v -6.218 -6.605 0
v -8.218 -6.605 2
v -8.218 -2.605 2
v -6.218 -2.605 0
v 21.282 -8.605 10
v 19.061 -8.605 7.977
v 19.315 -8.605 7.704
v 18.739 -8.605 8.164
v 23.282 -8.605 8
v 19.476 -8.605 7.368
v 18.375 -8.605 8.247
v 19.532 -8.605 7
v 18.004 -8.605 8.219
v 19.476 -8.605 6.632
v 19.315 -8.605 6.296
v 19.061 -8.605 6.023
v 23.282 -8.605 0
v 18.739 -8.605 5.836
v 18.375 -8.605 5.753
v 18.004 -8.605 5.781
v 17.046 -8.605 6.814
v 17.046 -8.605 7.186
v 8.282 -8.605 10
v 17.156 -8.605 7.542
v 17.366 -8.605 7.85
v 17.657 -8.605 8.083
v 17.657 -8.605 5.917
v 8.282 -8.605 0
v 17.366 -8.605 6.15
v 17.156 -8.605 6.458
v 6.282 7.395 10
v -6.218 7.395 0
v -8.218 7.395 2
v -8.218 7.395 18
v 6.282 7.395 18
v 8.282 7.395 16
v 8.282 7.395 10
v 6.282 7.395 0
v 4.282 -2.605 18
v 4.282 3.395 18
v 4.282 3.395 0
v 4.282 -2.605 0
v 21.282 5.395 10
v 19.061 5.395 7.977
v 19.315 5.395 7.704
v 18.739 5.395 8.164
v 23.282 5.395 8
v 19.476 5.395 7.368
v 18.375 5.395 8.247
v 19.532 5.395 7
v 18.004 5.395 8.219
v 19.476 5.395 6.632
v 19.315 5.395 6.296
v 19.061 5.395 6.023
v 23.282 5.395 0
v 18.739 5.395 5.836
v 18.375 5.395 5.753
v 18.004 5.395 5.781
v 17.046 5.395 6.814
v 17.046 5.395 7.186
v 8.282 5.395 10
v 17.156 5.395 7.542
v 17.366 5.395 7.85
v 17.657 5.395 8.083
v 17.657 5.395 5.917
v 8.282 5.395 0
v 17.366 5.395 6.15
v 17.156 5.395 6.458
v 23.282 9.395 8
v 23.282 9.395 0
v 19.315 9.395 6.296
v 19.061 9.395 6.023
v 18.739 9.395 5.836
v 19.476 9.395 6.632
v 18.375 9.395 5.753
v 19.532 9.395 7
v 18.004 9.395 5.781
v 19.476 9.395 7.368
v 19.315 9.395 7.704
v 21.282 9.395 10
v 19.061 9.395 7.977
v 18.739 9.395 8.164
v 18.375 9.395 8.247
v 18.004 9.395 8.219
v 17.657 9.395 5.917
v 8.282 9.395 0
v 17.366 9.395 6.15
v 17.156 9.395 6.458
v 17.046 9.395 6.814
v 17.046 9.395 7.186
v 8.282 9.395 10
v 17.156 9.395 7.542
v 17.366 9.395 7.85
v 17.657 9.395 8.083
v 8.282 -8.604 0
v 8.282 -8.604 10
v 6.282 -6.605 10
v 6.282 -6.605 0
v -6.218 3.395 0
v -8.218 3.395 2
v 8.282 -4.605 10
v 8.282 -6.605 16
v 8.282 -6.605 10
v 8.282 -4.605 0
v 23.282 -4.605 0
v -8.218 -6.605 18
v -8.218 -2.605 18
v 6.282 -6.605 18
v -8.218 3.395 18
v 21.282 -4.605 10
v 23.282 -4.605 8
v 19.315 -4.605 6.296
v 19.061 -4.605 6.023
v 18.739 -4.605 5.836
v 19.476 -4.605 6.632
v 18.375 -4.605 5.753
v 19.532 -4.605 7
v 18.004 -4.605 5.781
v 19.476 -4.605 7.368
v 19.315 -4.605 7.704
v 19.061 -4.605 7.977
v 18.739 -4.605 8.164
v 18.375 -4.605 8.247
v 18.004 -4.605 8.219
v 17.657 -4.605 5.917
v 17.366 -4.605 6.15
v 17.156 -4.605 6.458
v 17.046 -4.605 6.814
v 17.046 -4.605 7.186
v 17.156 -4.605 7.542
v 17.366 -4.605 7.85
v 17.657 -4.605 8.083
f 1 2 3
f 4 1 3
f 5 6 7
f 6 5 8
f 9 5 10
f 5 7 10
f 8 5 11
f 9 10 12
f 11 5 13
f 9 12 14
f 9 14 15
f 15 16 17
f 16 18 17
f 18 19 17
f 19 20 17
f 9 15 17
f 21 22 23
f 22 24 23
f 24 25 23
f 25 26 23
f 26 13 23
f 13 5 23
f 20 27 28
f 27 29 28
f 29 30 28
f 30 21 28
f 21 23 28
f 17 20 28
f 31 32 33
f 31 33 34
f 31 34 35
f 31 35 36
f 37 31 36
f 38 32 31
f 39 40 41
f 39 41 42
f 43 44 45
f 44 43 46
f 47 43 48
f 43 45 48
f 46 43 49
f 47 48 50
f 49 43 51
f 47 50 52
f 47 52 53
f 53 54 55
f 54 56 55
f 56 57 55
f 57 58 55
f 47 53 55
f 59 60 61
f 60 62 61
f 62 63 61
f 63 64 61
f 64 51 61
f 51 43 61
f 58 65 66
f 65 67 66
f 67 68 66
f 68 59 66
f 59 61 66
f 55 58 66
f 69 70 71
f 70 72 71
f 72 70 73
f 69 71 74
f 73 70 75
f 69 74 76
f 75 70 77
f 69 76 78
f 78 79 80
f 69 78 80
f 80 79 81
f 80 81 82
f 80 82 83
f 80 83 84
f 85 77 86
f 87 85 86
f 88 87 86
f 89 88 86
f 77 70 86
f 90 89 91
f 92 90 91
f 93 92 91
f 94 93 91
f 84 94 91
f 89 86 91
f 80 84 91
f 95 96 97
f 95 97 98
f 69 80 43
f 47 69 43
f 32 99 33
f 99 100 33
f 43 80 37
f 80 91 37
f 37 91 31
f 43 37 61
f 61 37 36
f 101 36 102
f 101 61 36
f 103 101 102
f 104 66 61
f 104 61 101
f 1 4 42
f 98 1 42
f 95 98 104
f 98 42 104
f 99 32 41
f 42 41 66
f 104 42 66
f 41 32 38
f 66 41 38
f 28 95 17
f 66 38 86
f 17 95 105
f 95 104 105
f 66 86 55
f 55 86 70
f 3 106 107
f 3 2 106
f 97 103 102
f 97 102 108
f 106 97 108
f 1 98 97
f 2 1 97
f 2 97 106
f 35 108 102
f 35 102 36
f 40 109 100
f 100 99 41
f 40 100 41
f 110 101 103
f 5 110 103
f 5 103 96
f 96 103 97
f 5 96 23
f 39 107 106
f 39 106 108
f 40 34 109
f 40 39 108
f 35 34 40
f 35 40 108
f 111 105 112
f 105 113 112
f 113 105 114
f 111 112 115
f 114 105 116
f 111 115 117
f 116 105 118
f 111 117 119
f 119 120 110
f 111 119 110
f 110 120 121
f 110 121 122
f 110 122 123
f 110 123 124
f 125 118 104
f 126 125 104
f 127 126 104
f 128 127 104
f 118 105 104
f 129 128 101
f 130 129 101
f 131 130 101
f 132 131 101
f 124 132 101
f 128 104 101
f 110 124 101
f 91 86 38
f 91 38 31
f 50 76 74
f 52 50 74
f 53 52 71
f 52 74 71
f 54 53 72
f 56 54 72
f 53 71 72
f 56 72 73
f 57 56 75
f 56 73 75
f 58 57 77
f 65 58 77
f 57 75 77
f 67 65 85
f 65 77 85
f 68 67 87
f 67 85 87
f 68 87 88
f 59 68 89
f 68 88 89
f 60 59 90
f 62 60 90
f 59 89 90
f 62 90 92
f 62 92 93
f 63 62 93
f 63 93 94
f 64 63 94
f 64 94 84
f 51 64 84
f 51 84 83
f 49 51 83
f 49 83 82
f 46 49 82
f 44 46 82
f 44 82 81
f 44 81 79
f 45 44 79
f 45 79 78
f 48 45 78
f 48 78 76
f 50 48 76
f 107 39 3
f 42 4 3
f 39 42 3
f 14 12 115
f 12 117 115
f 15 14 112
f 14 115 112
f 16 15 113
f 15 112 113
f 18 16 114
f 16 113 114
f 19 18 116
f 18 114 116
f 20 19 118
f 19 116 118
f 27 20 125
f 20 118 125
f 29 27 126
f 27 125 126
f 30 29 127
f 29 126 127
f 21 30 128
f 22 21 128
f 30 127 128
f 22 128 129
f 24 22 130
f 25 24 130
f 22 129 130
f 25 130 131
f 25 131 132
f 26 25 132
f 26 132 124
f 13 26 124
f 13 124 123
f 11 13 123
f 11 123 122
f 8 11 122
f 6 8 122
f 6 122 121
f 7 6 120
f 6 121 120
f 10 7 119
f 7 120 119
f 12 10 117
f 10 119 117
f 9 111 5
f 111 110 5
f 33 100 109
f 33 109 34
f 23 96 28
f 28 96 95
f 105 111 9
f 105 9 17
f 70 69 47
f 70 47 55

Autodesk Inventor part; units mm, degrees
ref_plane "YZ Plane" through (0, 0, 0) normal (1, 0, 0) x (0, 1, 0)
ref_plane "XZ Plane" through (0, 0, 0) normal (0, 1, 0) x (-1, 0, 0)
ref_plane "XY Plane" through (0, 0, 0) normal (0, 0, 1) x (1, 0, 0)
sketch "Sketch1" plane through (0, 0, 0) normal (0, 0, 1) x (1, 0, 0)
  line L0 (-8.218, 3.3953) -> (4.282, 3.3953)
  line L1 (4.282, 3.3953) -> (4.282, -2.6047)
  line L2 (4.282, -2.6047) -> (-8.218, -2.6047)
  line L3 (-8.218, -2.6047) -> (-8.218, 3.3953)
  line L4 (-8.218, 7.3953) -> (8.282, 7.3953)
  line L5 (8.282, 7.3953) -> (8.282, -6.6047)
  line L6 (8.282, -6.6047) -> (-8.218, -6.6047)
  line L7 (-8.218, -6.6047) -> (-8.218, 7.3953)
  point P0 (0, 0)
  dimension "d0" = 12.5
  dimension "d1" = 6
  dimension "d2" = 4
  dimension "d3" = 4
  dimension "d4" = 4
extrude "Extrusion1" add sketch "Sketch1" along normal blind 18 contours L7 L4 L5 L6 L2 L1 L0
sketch "Sketch2" plane through (8.282, -6.6047, 0) normal (1, 0, 0) x (0, 0, -1)
  line L0 (-10, 12) -> (0, 12)
  line L1 (0, 12) -> (0, 2)
  line L2 (0, 2) -> (-10, 2)
  line L3 (-10, 2) -> (-10, 12)
  line L4 (0, 14) -> (0, 0) projected
  line L5 (0, 14) -> (-18, 14) projected
  line L6 (0, 0) -> (-18, 0) projected
  line L7 (-10, 12) -> (0, 12)
  line L8 (0, 12) -> (0, 16)
  line L9 (0, 16) -> (-10, 16)
  line L10 (-10, 16) -> (-10, 12)
  line L11 (0, 2) -> (-10, 2)
  line L12 (-10, 2) -> (-10, -2)
  line L13 (-10, -2) -> (0, -2)
  line L14 (0, -2) -> (0, 2)
  point P0 (0, 6.6047)
  dimension "d7" = 10
  dimension "d8" = 10
  dimension "d9" = 2
  dimension "d10" = 2
  dimension "d11" = 4
  dimension "d12" = 4
extrude "Extrusion2" add sketch "Sketch2" along normal blind 15 contours L10 L5 L4 L0 | L2 L4 L6 L12 | L10 L9 L8 L5 | L6 L14 L13 L12
chamfer "Chamfer1" distance 2 angle 45 1 edges at (8.282, -6.6047, 5)
chamfer "Chamfer2" distance 2 angle 45 1 edges at (8.282, 7.3953, 5)
sketch "Sketch3" plane through (23.282, 9.3953, 10) normal (0, 1, 0) x (1, 0, 0)
  line L0 (-15, 0) -> (0, 0) projected
  line L1 (0, 10) -> (0, 0) projected
  circle A0 centre (-5, 3) radius 1.25
  point P0 (-23.282, 10)
  dimension "d21" = 3
  dimension "d22" = 5
  dimension "d23" = 2.5
extrude "Extrusion3" cut sketch "Sketch3" against normal blind 30
chamfer "Chamfer3" distance 2 angle 45 4 edges at (23.282, -6.6047, 10) (23.282, 7.3953, 10) (-8.218, 5.3953, 0) (-8.218, -4.6047, 0)
chamfer "Chamfer4" distance 2 angle 45 1 edges at (8.282, 0.3953, 18)
properties part number "Bottom pully rack"
